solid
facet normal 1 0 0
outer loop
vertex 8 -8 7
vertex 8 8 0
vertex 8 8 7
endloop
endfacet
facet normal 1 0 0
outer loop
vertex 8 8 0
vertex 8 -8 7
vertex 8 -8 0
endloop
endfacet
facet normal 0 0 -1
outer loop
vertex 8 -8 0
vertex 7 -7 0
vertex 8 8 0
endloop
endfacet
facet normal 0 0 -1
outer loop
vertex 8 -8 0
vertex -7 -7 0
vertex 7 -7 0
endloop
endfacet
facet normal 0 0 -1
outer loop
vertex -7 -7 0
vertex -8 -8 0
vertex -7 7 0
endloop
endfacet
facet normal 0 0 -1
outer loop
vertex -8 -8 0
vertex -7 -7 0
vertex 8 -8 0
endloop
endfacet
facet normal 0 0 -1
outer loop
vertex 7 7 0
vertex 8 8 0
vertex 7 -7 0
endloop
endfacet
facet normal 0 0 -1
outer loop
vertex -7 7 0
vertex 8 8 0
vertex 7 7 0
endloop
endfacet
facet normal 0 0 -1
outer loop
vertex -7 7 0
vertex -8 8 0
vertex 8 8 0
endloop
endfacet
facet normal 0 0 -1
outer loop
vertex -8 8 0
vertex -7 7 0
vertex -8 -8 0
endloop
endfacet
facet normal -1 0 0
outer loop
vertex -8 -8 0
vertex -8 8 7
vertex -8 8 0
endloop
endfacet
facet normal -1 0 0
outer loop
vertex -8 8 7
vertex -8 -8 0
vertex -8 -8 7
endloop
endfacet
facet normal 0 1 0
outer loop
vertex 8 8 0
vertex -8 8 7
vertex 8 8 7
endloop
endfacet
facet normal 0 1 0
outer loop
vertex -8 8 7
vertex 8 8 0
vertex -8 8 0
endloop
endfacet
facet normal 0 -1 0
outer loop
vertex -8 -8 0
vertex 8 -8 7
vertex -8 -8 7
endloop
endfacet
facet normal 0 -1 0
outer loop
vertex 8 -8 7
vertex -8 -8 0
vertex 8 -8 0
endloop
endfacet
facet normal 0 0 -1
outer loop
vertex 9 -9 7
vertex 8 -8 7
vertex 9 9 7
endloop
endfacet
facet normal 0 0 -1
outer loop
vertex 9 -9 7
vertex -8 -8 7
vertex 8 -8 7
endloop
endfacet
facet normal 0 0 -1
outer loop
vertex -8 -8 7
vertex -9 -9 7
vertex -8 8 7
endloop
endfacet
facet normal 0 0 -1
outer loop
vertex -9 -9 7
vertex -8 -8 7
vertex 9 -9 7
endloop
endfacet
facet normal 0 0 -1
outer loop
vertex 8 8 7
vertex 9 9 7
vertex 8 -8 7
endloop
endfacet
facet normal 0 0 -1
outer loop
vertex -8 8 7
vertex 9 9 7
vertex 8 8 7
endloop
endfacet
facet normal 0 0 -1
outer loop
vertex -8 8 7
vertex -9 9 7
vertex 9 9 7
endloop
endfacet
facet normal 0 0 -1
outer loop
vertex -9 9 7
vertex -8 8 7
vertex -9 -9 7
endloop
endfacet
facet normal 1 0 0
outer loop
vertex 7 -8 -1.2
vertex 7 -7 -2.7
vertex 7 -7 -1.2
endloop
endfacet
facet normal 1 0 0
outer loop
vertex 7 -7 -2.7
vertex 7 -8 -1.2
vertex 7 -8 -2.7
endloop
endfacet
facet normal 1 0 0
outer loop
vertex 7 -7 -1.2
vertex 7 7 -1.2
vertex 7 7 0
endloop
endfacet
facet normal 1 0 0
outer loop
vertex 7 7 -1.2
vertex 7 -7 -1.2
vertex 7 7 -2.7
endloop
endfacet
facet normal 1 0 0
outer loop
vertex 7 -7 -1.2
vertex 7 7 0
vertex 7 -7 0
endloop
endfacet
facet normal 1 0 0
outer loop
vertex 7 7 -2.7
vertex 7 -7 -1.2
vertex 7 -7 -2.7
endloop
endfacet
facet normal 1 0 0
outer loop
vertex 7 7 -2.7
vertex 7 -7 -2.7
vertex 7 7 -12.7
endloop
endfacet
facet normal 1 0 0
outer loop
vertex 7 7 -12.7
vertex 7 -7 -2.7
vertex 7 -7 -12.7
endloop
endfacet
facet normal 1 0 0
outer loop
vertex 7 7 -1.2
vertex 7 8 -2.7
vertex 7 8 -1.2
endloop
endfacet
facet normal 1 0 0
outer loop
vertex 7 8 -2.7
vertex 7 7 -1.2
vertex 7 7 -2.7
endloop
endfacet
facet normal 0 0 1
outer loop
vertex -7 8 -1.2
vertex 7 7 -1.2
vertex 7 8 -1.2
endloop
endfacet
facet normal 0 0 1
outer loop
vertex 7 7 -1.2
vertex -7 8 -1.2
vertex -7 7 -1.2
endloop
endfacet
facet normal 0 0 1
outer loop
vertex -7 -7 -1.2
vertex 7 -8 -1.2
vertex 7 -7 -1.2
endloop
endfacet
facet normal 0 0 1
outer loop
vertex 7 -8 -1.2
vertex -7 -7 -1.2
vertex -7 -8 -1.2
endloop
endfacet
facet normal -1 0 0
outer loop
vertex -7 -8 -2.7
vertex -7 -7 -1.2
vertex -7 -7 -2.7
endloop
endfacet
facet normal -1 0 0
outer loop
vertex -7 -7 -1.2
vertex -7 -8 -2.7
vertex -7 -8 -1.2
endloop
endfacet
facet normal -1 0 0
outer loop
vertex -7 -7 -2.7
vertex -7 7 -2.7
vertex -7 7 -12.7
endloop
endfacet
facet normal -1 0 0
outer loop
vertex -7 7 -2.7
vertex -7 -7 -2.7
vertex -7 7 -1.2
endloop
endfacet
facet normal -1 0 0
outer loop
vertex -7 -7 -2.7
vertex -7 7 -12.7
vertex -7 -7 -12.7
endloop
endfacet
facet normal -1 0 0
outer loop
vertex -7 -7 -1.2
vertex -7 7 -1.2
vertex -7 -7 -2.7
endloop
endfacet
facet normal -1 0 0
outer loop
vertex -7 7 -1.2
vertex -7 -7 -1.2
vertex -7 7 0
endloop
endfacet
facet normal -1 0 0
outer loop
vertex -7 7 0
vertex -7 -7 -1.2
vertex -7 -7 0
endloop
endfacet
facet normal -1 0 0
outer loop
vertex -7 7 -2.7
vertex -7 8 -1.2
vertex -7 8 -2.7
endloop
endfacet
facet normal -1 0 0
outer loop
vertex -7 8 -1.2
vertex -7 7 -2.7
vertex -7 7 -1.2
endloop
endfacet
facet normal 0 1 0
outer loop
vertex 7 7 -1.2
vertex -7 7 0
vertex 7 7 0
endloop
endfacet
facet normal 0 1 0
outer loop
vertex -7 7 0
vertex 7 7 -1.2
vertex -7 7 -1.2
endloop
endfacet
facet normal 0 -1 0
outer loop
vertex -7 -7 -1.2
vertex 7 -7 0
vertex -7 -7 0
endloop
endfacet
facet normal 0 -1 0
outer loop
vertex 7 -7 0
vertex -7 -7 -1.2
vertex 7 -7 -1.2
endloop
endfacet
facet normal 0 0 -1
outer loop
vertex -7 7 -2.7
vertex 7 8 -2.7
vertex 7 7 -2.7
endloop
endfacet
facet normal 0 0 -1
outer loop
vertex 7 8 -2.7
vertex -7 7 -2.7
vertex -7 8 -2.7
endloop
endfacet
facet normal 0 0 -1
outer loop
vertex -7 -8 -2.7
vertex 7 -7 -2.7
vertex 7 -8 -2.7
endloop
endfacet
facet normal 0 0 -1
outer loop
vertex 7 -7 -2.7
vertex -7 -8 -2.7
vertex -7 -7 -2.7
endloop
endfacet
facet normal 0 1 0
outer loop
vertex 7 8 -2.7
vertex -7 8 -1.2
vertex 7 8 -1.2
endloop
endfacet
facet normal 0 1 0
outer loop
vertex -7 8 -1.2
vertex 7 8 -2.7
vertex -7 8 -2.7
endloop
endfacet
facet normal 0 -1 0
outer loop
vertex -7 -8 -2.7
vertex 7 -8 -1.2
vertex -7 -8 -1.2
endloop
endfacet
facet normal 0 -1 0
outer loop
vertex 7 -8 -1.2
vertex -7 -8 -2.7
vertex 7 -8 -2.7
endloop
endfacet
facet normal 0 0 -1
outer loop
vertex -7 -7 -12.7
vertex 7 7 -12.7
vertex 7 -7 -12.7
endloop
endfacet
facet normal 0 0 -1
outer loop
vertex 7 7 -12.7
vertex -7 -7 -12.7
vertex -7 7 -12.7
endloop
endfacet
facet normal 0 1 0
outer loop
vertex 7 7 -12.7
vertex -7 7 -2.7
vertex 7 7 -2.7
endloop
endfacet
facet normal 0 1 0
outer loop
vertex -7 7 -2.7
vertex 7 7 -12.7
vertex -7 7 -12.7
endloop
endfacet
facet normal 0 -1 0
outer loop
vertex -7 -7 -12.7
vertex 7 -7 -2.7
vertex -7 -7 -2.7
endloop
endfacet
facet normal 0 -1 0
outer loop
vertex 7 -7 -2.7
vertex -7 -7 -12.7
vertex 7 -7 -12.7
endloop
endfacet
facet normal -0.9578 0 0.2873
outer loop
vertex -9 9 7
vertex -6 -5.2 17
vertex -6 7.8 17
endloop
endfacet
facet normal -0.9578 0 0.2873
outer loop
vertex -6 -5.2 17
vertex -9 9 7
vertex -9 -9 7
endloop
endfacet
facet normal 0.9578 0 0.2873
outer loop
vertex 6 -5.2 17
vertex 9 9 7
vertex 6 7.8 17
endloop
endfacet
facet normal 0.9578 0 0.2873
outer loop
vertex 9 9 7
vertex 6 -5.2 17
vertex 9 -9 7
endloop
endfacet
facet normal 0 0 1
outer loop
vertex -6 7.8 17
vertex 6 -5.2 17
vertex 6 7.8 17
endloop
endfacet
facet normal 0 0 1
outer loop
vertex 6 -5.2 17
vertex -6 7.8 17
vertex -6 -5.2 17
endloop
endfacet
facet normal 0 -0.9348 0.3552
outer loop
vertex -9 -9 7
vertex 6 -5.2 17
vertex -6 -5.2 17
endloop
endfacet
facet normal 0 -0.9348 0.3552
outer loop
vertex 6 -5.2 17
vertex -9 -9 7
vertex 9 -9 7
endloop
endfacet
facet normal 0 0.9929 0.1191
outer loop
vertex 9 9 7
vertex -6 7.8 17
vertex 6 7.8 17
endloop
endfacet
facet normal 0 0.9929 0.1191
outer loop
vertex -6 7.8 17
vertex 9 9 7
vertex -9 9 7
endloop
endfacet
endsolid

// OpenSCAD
key_switch(0, 0);

// key_hole(0, 0);

module key_switch(x, y) {
    union() {
        h1 = 2;
        translate([x, y, h1 / 2]) {
            cube([16, 16, h1], center=true);
        }
        h2 = 5;
        translate([x, y, h1 + h2 / 2]) {
            cube([16, 16, h2], center=true);
        }
        h3 = 1.2;
        translate([x, y, -h3 / 2]) {
            cube([14, 14, h3], center=true);
        }
        h4 = 1.5;
        translate([x, y, -h3 - h4 / 2]) {
            cube([14, 16, h4], center=true);
        }
        h5 = 10;
        translate([x, y, -h3 - h4 - h5 / 2]) {
            cube([14, 14, h5], center=true);
        }
        key_cap(x, y);
    }
}

module key_cap(x, y) {
    wx1 = 18;
    dx1 = wx1 / 2;

    wy1 = 18;
    dy1 = wy1 / 2;

    wx2 = 12;
    dx2 = wx2 / 2;

    wy2 = 13;
    ry2 = 0.6; // should be greater than 0.5

    z1 = 7;

    z2 = z1 + 10;

    points = [
    [x + dx1, y + dy1, z1], // 0
    [x + dx1, y - dy1, z1], // 1
    [x - dx1, y + dy1, z1], // 2
    [x - dx1, y - dy1, z1], // 3
    [x + dx2, y + ry2 * wy2, z2], // 4
    [x + dx2, y - (1 - ry2) * wy2, z2], // 5
    [x - dx2, y + ry2 * wy2, z2], // 6
    [x - dx2, y - (1 - ry2) * wy2, z2] // 7
    ];
    
    // "All faces must have points ordered in the same direction . OpenSCAD prefers clockwise when looking at each face from outside inwards (from OpenSCAD User Manual/Primitive Solids)"
    faces = [
        [0, 2, 3, 1], // bottom
        [0, 1, 5, 4], // right
        [1, 3, 7, 5], // front
        [3, 2, 6, 7], // left
        [2, 0, 4, 6], // back
        [4, 5, 7, 6]  // top
    ];
    
    polyhedron(points, faces);
}

module key_hole(x, y) {
    union() {
        h1 = 2;
        translate([x, y, h1 / 2]) {
            cube([16, 16, h1], center=true);
        }
        h2 = 5;
        translate([x, y, h1 + h2 / 2]) {
            cube([16, 16, h2], center=true);
        }
        h3 = 1.2;
        translate([x, y, -h3 / 2]) {
            cube([14, 14, h3], center=true);
        }
        h4 = 1.5;
        translate([x, y, -h3 - h4 / 2]) {
            cube([14, 14, h4], center=true);
        }
        h5 = 10;
        translate([x, y, -h3 - h4 - h5 / 2]) {
            cube([14, 14, h5], center=true);
        }
    }
}
